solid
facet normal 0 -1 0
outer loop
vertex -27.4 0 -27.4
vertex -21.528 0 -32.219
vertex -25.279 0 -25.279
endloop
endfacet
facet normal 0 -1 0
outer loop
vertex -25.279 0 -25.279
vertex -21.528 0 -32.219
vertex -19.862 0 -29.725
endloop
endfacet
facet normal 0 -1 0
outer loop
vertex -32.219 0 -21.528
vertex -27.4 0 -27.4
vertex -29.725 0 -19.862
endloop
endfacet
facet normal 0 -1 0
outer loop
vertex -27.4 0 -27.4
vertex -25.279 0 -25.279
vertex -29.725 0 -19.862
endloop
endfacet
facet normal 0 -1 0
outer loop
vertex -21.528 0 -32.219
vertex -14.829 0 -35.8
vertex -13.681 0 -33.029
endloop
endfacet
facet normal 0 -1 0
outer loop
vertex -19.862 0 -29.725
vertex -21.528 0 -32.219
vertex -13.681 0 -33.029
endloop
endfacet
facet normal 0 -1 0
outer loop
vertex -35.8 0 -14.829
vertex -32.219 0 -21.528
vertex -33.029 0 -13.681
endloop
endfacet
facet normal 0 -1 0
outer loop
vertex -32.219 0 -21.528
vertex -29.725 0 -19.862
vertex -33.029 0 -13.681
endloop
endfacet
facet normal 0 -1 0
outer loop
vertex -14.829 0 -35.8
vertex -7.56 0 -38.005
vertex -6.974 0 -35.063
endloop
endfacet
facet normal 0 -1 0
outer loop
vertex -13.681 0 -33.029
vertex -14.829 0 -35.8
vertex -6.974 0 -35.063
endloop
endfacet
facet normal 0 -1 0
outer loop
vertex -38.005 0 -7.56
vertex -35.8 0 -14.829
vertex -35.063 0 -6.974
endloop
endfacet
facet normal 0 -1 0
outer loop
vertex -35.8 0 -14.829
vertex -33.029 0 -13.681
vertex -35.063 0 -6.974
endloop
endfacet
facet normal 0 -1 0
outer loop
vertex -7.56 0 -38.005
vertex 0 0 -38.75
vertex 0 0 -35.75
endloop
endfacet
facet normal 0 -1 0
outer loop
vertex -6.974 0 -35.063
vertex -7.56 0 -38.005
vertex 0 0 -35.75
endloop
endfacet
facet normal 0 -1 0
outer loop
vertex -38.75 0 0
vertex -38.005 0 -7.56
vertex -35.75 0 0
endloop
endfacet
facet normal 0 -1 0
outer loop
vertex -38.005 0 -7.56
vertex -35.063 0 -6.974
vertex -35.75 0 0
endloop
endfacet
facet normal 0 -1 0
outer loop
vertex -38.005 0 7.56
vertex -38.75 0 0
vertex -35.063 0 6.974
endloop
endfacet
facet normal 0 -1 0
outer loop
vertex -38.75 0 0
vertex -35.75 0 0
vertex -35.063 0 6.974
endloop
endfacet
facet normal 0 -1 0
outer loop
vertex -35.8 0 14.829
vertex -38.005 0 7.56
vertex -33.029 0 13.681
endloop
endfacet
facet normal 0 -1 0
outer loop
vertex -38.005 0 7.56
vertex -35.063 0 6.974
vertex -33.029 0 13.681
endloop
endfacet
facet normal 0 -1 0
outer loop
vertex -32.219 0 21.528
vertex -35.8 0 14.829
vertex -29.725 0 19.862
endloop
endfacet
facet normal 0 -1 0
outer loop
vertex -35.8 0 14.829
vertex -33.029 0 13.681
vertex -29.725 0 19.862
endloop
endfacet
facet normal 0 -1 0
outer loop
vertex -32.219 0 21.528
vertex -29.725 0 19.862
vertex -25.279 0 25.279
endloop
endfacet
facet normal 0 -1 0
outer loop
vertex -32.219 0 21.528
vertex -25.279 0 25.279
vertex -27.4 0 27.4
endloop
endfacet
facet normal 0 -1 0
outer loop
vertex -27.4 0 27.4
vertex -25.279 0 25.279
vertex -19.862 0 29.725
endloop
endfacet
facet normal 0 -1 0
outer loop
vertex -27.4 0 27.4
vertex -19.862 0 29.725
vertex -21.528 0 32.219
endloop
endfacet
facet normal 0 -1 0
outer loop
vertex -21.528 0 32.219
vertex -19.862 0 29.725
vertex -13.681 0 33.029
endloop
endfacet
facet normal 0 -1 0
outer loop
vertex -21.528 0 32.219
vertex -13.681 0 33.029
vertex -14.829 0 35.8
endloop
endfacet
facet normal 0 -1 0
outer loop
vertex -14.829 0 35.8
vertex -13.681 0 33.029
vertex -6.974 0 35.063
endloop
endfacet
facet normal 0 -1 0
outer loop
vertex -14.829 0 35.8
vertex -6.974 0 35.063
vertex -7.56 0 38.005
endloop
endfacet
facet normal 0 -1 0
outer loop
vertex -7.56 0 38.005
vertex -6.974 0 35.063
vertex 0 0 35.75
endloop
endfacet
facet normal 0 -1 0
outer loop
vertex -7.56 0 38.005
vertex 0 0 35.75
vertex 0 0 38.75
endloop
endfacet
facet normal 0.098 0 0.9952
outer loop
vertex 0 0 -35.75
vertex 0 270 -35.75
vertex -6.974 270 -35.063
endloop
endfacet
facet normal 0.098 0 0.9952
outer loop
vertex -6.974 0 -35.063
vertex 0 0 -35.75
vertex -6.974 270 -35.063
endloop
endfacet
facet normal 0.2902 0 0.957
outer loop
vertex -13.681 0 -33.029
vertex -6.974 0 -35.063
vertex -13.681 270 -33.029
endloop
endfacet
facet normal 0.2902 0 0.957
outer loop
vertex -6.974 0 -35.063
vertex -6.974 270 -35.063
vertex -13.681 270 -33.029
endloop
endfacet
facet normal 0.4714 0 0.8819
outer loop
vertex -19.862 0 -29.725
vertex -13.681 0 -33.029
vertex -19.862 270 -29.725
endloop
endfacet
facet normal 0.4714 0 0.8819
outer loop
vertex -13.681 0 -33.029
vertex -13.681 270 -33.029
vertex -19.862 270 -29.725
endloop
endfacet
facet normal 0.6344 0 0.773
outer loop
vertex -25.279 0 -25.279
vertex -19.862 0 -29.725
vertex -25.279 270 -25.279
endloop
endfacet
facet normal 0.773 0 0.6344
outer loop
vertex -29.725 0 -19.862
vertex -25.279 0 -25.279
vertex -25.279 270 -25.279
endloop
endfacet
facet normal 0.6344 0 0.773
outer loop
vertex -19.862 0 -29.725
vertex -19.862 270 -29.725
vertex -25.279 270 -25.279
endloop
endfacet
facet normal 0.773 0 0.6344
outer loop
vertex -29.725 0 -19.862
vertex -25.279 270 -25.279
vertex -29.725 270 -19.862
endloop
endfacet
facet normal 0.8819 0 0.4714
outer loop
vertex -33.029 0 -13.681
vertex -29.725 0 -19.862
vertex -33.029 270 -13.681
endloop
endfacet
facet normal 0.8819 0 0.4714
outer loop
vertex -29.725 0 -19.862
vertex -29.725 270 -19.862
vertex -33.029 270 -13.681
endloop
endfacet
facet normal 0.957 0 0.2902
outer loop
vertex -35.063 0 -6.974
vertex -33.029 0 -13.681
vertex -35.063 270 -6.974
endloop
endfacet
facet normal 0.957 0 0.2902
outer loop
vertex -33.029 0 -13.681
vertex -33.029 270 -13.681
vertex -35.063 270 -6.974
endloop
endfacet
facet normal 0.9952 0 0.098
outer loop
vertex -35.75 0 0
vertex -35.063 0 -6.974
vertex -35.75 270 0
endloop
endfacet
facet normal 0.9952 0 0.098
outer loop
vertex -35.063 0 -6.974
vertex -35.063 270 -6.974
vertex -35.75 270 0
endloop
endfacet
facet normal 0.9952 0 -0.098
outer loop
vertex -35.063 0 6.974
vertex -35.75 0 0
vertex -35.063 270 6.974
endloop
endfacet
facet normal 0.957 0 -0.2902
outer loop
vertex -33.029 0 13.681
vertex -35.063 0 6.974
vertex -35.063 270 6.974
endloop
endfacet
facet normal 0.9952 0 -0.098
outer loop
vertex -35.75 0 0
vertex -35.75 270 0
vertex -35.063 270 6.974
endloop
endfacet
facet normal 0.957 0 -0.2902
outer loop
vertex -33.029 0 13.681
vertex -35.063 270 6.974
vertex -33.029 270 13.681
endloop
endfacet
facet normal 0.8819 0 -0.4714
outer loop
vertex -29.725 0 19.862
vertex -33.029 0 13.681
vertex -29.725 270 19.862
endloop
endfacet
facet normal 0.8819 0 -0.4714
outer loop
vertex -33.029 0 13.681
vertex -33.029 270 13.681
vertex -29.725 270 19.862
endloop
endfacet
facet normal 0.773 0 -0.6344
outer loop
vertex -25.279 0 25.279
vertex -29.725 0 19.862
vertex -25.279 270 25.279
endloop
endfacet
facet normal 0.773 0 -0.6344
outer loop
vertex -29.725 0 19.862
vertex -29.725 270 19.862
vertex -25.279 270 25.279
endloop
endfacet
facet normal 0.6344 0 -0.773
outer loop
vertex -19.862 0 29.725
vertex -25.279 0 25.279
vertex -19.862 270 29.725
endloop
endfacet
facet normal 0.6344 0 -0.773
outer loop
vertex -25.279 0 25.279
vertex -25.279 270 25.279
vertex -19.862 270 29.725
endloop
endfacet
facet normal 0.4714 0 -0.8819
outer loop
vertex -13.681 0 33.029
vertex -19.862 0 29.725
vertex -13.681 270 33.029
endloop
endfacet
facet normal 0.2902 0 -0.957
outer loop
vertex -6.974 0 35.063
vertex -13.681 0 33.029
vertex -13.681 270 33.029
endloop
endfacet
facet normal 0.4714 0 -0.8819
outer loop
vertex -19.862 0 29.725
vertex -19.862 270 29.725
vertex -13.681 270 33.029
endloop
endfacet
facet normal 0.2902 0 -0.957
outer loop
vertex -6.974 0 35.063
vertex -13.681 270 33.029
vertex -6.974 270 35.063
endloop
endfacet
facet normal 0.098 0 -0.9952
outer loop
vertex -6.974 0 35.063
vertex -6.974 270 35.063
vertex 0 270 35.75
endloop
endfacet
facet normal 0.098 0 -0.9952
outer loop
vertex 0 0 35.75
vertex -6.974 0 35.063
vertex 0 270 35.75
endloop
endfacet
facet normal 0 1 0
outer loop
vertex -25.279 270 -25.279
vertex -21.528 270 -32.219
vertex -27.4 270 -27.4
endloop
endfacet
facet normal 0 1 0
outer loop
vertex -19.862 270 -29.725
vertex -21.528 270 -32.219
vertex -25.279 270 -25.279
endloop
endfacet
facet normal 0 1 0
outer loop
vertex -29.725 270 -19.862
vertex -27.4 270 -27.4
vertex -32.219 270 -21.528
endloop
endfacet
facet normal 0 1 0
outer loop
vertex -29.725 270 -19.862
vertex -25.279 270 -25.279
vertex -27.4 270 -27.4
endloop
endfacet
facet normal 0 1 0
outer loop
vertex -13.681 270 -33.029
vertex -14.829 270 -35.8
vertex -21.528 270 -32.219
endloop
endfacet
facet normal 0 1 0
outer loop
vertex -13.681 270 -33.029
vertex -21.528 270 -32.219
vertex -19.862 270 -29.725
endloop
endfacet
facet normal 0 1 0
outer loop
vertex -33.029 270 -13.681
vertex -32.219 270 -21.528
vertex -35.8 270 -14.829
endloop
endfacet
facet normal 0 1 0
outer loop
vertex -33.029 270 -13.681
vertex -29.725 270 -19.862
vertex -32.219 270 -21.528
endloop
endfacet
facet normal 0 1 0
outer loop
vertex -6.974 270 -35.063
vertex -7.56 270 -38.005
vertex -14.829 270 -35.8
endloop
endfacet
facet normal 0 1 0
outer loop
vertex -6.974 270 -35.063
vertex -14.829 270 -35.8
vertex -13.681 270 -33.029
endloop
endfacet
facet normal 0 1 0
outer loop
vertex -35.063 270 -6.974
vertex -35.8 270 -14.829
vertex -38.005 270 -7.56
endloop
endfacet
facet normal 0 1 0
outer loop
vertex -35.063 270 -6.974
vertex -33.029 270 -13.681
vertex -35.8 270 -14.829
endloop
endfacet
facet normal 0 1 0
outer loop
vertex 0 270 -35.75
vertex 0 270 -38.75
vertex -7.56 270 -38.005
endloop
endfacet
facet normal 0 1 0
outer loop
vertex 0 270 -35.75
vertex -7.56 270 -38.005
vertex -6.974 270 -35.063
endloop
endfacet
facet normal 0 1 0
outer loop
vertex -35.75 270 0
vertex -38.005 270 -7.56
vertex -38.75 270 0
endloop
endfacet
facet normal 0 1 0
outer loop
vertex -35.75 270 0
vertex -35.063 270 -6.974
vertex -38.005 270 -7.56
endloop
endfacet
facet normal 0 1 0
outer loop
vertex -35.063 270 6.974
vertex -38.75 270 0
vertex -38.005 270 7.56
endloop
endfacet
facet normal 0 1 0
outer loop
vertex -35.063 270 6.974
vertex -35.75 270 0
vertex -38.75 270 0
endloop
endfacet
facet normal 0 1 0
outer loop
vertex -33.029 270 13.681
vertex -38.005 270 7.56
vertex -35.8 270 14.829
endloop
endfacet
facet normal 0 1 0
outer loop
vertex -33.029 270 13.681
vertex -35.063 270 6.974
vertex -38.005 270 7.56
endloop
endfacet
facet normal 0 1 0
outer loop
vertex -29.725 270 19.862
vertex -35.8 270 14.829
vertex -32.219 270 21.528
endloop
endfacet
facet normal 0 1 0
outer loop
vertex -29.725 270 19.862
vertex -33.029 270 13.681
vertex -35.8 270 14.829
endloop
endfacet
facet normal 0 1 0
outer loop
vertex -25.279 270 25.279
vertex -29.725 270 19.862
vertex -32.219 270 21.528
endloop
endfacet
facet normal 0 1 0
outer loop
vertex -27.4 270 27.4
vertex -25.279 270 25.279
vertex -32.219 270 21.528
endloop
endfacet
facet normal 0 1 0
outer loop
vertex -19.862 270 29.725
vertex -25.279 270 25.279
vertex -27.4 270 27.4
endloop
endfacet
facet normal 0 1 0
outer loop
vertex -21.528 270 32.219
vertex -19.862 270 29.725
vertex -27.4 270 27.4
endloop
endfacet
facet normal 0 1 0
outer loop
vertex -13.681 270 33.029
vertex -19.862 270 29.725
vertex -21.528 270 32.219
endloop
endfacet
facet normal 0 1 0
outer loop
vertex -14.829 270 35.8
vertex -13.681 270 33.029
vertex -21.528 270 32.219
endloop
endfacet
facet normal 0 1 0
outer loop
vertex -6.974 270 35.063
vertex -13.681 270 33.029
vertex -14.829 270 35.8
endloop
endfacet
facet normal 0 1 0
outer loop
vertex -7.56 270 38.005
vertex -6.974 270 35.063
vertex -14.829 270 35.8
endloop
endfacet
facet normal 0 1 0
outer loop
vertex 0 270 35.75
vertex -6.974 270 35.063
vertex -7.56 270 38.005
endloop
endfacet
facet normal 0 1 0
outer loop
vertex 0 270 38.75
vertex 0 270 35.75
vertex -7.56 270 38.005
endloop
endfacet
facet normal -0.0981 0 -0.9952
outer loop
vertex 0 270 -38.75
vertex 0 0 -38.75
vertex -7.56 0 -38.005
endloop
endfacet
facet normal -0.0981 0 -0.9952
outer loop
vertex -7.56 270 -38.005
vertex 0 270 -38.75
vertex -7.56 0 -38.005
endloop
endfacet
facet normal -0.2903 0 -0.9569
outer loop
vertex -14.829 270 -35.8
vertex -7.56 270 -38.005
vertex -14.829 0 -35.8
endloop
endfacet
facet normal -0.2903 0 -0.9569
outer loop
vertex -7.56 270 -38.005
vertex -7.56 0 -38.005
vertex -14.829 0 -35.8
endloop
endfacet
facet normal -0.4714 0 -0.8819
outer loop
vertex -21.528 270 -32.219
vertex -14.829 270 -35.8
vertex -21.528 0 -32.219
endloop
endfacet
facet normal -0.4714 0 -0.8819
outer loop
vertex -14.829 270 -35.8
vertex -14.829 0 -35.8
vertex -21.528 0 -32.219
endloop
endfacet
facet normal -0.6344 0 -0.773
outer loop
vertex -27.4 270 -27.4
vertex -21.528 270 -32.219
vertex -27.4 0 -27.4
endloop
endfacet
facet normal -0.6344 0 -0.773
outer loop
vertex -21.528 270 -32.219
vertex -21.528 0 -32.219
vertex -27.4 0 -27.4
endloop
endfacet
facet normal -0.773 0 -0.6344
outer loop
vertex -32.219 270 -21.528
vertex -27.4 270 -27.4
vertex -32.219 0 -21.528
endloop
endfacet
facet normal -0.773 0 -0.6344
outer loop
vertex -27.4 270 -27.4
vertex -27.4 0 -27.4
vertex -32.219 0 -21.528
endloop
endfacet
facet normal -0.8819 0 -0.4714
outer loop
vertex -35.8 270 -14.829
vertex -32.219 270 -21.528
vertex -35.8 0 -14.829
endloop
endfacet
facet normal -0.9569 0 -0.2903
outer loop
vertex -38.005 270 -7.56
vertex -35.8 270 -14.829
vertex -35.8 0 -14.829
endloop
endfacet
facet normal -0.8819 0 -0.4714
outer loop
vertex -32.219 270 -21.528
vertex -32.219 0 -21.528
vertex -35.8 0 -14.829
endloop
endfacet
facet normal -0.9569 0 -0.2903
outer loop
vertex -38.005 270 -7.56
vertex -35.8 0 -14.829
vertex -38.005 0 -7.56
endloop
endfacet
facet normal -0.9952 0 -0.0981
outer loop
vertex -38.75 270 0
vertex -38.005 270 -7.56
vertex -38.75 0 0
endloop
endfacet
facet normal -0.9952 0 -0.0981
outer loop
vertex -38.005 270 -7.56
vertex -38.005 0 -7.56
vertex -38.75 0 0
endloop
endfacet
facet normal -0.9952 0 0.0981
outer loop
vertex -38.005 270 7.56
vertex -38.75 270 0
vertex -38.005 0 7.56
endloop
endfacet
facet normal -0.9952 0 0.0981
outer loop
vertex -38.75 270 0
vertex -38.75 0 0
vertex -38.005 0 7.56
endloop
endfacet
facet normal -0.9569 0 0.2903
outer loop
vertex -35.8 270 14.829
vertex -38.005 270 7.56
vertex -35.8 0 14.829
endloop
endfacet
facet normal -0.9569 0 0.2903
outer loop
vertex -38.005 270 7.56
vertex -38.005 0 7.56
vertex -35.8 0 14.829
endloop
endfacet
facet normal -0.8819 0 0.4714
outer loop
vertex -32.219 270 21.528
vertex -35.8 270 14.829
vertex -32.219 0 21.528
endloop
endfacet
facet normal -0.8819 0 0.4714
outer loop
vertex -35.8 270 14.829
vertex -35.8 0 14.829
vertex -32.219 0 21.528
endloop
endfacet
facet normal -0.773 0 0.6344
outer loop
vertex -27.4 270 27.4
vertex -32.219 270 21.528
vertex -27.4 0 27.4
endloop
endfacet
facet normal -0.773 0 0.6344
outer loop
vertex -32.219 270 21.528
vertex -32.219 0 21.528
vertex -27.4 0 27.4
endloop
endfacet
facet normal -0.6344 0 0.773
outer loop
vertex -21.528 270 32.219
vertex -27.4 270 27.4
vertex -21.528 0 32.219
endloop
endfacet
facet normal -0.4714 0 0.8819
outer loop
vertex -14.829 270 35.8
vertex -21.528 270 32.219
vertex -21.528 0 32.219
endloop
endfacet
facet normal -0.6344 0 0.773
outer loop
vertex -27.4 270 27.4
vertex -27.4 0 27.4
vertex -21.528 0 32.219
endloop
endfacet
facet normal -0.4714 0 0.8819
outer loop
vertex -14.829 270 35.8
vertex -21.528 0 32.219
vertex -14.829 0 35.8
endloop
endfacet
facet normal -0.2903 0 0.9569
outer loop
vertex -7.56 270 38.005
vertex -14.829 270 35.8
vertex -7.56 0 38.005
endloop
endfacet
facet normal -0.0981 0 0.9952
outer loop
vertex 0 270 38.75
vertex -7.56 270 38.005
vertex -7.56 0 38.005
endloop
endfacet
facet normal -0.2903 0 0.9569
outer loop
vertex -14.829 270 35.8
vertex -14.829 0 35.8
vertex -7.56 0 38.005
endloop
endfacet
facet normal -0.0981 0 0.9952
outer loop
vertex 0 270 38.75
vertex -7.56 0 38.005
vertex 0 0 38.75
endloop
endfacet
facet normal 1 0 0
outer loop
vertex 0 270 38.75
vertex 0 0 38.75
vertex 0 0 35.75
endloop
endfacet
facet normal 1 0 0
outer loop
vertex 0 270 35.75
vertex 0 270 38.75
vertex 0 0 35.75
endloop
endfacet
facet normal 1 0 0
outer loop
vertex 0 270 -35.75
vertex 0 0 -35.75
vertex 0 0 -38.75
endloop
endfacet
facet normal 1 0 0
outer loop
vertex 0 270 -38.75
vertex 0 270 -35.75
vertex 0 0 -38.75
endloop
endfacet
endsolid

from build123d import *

# Parameters (mm, degrees)
SKETCH1_R           = 38.75
BOSS_EXTRUDE2_DEPTH = 270
CUT_EXTRUDE2_DEPTH  = 480
SKETCH4_W           = 38.75
SKETCH4_H           = 77.5
CUT_EXTRUDE3_DEPTH  = 480


with BuildPart() as part:
    # Sketch1 → Boss-Extrude2 (new body)
    with BuildSketch(Plane(origin=(0, 0, 0), x_dir=(1, 0, 0), z_dir=(0, 1, 0))):
        with Locations(Location((0, 0, 0), (0, 0, 270))):
            Circle(SKETCH1_R)
    extrude(amount=BOSS_EXTRUDE2_DEPTH)

    # Sketch3 → Cut-Extrude2 (cut)
    with BuildSketch(Plane(origin=(0, 270, 0), x_dir=(1, 0, 0), z_dir=(0, 1, 0))):
        with BuildLine():
            Line((0, -35.75), (0, 35.75))
            ThreePointArc((0, 35.75), (-35.75, 0), (0, -35.75))
        make_face()
    extrude(amount=-CUT_EXTRUDE2_DEPTH, mode=Mode.SUBTRACT)

    # Sketch4 → Cut-Extrude3 (cut)
    with BuildSketch(Plane(origin=(0, 270, 0), x_dir=(1, 0, 0), z_dir=(0, 1, 0))):
        with Locations((19.375, 0)):
            Rectangle(SKETCH4_W, SKETCH4_H)
    extrude(amount=-CUT_EXTRUDE3_DEPTH, mode=Mode.SUBTRACT)


solid = part.part
